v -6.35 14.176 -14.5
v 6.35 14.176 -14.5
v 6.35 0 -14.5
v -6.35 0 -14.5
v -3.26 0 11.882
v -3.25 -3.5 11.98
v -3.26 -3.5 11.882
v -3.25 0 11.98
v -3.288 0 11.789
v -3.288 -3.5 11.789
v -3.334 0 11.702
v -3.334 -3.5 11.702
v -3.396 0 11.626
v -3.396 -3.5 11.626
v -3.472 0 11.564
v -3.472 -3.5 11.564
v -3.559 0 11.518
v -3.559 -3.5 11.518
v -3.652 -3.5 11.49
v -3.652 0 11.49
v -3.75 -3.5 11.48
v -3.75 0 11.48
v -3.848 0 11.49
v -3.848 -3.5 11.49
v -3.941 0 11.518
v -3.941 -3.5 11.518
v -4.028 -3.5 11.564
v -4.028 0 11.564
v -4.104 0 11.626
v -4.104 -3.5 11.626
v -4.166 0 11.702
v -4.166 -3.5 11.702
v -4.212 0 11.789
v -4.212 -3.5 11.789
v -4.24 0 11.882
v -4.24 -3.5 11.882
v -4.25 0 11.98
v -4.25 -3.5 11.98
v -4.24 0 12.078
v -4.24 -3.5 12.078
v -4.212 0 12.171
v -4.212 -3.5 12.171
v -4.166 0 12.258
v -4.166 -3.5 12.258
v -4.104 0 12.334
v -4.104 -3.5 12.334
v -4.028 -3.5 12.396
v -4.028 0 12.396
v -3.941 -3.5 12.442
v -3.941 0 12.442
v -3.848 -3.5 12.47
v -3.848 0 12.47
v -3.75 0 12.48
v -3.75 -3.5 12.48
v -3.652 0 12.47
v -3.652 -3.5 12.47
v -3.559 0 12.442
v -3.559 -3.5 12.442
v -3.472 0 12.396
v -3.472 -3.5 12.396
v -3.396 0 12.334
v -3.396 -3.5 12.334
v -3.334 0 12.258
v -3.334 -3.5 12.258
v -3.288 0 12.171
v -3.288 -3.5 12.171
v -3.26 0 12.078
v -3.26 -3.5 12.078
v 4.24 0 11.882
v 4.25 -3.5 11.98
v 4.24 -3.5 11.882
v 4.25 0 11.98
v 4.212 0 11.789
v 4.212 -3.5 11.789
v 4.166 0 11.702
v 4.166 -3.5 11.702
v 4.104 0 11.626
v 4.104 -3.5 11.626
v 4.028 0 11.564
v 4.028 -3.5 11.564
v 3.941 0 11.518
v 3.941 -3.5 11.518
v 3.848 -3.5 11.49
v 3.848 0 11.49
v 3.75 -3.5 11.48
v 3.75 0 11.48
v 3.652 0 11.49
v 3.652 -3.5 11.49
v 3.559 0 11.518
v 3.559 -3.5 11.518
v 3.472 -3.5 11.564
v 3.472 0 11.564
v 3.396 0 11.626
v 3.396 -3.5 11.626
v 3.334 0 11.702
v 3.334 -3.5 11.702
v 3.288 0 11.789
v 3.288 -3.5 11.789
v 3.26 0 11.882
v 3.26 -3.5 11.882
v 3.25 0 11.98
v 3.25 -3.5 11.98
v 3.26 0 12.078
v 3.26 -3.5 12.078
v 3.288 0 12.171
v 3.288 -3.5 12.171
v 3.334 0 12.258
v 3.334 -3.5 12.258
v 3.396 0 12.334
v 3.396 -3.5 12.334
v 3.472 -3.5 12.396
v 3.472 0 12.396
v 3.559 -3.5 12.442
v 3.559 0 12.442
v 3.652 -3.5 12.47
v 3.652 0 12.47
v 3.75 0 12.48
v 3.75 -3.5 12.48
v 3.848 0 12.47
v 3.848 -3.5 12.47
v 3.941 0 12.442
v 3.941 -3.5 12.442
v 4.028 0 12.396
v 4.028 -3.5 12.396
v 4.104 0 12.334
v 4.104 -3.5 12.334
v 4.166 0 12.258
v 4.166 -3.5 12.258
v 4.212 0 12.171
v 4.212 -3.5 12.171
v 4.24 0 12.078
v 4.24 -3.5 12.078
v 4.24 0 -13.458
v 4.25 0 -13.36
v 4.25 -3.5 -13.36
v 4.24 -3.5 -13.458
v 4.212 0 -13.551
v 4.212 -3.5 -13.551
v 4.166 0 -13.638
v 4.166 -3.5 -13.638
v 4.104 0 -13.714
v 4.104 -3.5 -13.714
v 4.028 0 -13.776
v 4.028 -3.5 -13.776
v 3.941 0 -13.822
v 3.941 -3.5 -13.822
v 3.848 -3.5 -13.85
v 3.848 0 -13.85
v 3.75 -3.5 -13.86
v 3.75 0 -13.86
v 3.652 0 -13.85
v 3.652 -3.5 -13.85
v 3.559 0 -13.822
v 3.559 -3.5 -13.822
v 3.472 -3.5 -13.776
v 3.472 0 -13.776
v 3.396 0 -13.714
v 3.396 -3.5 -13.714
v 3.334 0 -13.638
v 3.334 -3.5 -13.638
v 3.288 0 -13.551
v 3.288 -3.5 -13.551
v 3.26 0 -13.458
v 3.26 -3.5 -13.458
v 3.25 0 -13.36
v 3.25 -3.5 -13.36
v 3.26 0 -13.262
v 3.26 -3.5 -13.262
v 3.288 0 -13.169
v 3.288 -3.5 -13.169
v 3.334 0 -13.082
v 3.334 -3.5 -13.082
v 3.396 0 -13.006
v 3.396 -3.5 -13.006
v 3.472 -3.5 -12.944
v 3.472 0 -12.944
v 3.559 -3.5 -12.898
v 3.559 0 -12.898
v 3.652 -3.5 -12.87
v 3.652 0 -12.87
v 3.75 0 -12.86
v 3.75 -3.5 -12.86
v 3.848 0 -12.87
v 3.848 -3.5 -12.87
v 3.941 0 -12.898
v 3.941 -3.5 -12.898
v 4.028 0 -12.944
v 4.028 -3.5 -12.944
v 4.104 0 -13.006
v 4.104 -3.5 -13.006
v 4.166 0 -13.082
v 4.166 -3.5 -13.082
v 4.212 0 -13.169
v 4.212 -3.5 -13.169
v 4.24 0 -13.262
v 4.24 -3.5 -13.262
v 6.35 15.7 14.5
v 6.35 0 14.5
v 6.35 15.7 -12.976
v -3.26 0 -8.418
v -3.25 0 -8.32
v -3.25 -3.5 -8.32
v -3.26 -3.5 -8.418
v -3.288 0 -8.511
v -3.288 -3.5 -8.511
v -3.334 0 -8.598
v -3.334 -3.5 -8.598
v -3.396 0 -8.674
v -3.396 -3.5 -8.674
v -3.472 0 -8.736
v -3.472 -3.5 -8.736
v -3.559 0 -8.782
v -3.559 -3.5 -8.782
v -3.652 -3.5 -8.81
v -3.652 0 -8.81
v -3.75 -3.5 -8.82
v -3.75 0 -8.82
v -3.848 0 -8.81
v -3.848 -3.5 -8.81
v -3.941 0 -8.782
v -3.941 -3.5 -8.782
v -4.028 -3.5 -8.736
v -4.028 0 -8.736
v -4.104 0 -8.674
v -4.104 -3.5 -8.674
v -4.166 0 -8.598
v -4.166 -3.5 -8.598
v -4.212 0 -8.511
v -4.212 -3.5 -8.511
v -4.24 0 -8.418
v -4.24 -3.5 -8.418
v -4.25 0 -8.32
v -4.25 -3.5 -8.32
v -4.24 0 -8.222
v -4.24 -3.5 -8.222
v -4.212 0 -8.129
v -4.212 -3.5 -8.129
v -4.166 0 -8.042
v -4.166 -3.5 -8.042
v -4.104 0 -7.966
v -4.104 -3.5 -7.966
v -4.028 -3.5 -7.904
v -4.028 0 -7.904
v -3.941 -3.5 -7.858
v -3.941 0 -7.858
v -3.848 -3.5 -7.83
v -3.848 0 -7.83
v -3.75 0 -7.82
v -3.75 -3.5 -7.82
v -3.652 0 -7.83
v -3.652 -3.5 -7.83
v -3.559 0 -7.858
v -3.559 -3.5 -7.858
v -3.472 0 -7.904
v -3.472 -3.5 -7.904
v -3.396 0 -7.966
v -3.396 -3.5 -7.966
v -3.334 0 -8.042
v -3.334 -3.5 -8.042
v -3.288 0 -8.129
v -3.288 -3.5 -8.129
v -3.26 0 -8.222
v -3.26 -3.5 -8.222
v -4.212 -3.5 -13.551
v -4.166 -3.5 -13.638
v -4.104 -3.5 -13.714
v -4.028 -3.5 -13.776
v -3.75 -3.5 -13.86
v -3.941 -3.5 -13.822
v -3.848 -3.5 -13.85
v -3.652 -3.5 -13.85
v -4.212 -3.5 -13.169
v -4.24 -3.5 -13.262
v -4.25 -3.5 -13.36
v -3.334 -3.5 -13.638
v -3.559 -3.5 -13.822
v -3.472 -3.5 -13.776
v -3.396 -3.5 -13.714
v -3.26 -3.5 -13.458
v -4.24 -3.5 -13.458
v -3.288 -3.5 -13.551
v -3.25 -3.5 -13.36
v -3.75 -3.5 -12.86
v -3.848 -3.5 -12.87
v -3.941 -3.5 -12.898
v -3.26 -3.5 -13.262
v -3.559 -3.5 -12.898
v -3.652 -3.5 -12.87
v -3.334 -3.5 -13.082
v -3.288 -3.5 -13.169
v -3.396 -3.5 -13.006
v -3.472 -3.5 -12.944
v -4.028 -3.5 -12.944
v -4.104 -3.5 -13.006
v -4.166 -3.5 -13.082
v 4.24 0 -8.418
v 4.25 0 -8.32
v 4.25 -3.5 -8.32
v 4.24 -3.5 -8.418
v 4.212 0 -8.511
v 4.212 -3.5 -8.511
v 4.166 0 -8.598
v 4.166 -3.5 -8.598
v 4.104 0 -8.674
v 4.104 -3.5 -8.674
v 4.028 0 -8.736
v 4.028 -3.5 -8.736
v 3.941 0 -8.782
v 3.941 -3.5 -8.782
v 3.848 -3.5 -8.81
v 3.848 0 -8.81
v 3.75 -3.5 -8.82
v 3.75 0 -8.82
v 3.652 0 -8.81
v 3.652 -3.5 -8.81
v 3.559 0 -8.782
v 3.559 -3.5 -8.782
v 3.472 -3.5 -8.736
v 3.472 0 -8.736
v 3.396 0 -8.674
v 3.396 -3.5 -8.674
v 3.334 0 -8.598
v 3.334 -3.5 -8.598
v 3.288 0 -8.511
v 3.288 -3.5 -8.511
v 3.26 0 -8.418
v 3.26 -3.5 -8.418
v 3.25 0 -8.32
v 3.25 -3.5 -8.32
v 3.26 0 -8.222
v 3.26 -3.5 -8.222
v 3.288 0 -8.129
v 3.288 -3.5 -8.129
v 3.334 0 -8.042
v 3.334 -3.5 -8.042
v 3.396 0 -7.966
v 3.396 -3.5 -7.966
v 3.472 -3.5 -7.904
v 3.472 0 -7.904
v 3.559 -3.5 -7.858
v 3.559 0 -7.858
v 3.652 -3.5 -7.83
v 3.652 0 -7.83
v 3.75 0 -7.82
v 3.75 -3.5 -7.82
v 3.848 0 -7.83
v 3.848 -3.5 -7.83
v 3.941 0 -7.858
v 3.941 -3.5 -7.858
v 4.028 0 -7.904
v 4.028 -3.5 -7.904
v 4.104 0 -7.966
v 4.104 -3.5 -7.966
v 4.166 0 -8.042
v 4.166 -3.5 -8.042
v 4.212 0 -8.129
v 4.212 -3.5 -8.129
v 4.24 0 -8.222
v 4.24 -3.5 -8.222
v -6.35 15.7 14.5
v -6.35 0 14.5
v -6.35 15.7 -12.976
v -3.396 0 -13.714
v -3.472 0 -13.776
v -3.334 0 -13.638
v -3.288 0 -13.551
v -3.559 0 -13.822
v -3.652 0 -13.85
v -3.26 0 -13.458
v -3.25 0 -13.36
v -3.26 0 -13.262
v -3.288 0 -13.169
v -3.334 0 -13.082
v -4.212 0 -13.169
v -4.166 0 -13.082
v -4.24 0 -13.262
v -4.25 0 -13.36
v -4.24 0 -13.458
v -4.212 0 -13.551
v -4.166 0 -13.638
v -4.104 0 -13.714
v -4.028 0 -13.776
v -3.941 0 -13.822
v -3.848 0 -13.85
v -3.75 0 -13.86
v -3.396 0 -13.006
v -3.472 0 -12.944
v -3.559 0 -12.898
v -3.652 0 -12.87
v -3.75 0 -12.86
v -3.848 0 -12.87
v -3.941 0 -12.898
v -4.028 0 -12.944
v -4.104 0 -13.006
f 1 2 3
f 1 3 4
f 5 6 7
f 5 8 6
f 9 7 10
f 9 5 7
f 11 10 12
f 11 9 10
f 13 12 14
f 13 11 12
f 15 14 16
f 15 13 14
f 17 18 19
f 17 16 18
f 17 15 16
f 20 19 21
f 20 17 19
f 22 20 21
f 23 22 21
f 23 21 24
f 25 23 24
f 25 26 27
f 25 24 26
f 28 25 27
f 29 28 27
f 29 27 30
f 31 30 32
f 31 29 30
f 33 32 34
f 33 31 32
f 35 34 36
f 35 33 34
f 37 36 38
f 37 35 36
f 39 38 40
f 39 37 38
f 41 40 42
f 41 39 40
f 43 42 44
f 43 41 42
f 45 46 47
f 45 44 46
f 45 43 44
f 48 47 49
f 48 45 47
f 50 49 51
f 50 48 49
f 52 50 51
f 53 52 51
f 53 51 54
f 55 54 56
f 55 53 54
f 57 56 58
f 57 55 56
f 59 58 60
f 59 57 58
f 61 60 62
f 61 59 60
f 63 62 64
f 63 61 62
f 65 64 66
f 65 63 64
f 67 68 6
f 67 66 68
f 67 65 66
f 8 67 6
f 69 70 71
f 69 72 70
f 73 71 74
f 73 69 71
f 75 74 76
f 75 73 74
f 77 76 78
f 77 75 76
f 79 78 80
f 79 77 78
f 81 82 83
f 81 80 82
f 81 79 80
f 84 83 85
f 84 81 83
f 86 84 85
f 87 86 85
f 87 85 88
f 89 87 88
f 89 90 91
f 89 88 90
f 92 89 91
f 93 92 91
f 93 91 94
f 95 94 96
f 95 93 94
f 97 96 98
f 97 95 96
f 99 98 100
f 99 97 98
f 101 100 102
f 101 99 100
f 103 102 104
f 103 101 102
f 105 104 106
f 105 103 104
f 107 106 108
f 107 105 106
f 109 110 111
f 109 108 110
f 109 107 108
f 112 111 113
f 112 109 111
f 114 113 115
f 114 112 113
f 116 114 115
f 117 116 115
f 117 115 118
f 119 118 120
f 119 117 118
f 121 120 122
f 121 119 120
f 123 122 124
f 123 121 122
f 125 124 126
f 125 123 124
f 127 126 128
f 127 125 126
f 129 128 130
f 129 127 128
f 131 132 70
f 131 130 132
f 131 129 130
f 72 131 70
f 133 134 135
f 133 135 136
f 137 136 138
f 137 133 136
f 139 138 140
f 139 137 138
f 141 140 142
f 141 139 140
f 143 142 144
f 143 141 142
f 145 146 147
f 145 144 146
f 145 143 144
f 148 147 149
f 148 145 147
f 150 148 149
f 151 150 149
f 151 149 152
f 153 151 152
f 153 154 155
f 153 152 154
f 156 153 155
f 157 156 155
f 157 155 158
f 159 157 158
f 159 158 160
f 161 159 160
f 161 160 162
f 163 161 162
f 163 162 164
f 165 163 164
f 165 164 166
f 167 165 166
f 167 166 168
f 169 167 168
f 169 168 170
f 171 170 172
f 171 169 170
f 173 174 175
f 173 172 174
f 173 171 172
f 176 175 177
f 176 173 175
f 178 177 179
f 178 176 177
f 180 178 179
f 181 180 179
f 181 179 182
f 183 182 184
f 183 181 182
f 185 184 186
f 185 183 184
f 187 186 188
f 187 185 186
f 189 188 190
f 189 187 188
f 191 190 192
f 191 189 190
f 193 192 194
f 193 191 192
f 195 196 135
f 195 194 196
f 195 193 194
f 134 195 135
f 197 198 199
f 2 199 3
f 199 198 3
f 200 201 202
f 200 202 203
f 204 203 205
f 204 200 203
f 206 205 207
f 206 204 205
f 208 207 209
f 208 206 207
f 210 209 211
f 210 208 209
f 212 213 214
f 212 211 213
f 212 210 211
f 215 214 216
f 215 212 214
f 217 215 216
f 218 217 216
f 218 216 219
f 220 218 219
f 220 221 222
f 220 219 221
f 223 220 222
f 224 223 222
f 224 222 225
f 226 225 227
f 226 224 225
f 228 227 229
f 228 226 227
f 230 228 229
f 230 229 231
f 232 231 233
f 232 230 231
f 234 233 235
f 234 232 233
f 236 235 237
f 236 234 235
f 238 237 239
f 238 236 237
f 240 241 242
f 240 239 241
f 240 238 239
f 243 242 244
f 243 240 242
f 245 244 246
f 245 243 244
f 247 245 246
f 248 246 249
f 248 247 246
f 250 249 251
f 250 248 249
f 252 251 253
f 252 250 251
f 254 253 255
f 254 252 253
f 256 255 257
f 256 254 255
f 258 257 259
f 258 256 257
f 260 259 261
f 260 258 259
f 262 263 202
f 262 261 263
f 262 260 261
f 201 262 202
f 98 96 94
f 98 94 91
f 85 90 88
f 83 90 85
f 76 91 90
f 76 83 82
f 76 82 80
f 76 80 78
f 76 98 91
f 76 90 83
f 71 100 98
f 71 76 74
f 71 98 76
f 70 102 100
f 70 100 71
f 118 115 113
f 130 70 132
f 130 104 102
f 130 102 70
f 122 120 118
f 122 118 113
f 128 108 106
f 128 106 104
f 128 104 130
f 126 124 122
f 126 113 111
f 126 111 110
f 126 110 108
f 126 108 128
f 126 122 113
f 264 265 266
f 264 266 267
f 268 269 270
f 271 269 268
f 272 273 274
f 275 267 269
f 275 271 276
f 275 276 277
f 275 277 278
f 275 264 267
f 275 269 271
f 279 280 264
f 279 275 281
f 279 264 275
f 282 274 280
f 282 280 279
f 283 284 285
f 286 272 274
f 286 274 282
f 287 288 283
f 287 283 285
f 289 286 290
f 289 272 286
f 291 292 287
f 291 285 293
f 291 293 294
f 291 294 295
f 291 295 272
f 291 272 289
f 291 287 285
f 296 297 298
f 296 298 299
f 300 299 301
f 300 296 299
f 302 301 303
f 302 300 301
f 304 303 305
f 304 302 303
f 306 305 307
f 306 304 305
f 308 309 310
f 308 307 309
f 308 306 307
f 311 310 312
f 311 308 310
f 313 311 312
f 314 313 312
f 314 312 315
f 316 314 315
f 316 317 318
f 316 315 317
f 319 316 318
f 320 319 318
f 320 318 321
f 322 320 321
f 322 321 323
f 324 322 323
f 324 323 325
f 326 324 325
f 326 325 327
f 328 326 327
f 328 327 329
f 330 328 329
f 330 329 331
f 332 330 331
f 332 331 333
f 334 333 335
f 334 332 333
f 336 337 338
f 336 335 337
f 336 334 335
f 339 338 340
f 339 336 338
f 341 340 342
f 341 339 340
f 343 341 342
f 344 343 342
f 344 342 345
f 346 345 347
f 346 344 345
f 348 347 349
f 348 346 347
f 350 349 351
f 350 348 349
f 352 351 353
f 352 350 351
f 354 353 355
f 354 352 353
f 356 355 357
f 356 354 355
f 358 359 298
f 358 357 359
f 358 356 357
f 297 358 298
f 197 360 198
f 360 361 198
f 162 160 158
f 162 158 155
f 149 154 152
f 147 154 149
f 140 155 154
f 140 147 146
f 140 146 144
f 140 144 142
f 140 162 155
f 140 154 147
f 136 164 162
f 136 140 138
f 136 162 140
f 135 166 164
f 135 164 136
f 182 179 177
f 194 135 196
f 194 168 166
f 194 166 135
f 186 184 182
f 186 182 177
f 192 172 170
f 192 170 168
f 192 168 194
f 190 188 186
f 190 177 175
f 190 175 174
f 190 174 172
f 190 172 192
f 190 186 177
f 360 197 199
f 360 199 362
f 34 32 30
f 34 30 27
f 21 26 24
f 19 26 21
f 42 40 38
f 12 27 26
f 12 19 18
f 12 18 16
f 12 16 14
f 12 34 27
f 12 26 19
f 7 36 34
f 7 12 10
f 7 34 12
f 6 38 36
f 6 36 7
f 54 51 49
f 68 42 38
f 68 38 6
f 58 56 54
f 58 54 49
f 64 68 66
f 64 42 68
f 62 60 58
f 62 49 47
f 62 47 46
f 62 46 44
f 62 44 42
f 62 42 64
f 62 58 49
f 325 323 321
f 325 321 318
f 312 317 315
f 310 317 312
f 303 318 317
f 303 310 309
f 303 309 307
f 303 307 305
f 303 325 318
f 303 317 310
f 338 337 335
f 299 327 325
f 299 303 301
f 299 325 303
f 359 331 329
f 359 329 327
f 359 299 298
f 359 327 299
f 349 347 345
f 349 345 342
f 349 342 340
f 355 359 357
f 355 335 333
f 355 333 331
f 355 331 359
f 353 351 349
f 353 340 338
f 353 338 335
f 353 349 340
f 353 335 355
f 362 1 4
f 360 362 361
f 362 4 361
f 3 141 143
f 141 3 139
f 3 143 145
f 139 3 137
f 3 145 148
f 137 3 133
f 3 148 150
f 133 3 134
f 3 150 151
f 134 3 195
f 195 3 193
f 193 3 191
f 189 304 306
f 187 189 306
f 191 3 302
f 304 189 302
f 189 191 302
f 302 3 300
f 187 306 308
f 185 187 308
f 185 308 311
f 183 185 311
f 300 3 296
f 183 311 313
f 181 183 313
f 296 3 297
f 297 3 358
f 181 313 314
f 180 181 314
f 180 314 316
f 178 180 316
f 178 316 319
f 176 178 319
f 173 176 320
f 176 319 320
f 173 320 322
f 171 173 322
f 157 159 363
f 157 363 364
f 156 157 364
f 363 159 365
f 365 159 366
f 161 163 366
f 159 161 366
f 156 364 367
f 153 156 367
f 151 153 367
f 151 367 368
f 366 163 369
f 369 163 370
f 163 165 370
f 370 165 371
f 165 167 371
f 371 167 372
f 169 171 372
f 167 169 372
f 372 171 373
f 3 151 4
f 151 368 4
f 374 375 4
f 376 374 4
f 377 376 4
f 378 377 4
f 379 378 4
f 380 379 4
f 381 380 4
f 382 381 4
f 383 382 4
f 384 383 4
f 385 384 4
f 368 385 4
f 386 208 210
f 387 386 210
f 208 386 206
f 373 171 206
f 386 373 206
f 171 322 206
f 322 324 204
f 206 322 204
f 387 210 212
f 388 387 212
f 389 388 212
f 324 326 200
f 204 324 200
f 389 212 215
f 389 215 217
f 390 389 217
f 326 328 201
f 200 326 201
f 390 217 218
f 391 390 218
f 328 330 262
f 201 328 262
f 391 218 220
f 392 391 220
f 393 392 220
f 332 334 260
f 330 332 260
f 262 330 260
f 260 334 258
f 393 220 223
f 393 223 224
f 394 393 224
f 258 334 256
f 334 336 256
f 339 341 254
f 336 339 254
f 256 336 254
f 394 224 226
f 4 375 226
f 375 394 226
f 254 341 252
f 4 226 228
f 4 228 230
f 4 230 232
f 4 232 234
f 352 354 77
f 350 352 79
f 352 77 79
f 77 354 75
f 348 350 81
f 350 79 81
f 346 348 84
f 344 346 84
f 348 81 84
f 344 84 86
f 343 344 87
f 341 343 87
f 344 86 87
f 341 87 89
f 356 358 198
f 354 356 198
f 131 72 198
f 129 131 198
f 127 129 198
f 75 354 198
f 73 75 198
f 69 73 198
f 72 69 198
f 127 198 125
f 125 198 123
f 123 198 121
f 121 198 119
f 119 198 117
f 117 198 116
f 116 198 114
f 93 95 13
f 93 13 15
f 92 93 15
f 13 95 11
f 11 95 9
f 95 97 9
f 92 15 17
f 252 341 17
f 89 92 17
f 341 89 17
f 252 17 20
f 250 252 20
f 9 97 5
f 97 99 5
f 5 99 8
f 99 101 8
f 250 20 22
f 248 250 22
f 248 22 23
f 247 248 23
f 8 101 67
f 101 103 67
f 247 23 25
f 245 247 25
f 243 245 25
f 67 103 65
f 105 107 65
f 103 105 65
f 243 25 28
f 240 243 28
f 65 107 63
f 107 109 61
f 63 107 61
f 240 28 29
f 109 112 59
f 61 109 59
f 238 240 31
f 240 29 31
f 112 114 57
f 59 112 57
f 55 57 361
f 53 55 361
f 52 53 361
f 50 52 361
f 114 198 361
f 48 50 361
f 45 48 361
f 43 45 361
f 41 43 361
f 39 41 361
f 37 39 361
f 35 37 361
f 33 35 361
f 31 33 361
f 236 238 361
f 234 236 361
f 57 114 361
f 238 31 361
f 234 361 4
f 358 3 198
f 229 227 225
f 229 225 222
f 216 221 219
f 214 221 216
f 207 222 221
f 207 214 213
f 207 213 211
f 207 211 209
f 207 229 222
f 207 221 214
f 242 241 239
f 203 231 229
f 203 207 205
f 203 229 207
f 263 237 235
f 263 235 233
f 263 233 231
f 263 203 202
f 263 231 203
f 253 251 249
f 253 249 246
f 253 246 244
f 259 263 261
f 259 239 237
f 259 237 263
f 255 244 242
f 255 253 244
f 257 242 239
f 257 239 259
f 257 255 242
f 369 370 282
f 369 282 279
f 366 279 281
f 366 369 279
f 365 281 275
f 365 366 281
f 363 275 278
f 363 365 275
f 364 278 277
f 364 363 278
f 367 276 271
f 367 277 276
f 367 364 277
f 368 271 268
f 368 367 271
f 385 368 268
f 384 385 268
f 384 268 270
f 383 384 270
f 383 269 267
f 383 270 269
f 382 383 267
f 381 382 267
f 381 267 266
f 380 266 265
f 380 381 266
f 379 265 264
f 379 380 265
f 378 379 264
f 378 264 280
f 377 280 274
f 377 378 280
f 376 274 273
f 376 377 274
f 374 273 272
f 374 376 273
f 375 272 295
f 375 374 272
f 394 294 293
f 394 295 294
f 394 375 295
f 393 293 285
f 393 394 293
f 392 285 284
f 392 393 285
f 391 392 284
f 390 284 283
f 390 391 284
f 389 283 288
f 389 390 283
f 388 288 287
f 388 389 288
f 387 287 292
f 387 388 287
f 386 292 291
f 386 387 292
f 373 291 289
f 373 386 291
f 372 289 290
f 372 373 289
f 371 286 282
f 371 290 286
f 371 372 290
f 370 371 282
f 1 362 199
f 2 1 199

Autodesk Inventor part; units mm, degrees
ref_plane "YZ Plane" through (0, 0, 0) normal (1, 0, 0) x (0, 1, 0)
ref_plane "XZ Plane" through (0, 0, 0) normal (0, 1, 0) x (-1, 0, 0)
ref_plane "XY Plane" through (0, 0, 0) normal (0, 0, 1) x (1, 0, 0)
sketch "Sketch1" plane through (0, 0, 0) normal (0, 1, 0) x (-1, 0, 0)
  line L0 (6.35, 14.5) -> (-6.35, 14.5)
  line L1 (-6.35, 14.5) -> (-6.35, -14.5)
  line L2 (-6.35, -14.5) -> (6.35, -14.5)
  line L3 (6.35, -14.5) -> (6.35, 14.5)
  point P0 (0, 0)
  dimension "d0" = 29
  dimension "d1" = 12.7
  dimension "d2" = 6.35
  dimension "d3" = 14.5
extrude "Extrusion1" add sketch "Sketch1" along normal blind 15.7
sketch "Sketch2" plane through (0, 0, 0) normal (0, -1, 0) x (1, 0, 0)
  line L0 (-6.35, 14.5) -> (6.35, 14.5) projected
  line L1 (-6.35, -14.5) -> (-6.35, 14.5) projected
  line L2 (6.35, -14.5) -> (-6.35, -14.5) projected
  line L3 (6.35, 14.5) -> (6.35, -14.5) projected
  circle A0 centre (3.75, -13.36) radius 0.5
  circle A1 centre (-3.75, -8.32) radius 0.5
  circle A2 centre (3.75, -8.32) radius 0.5
  circle A3 centre (-3.75, -13.36) radius 0.5
  circle A4 centre (3.75, 11.98) radius 0.5
  circle A5 centre (-3.75, 11.98) radius 0.5
  point P0 (0, 0)
  dimension "d9" = 1
  dimension "d10" = 1
  dimension "d11" = 1
  dimension "d12" = 1
  dimension "d15" = 5.04
  dimension "d17" = 7.5
  dimension "d18" = 3.75
  dimension "d19" = 1
  dimension "d20" = 1
  dimension "d22" = 20.3
  dimension "d28" = 2.52
extrude "Extrusion2" add sketch "Sketch2" along normal blind 3.5 contours A0 | A1 | A2 | A3 | A4 | A5
chamfer "Chamfer2" distance 1.524 angle 45 1 edges at (0, 15.7, -14.5)
equation "\"d2\" = 0.5 * d1"
equation "\"d3\" = 0.5 * d0"
equation "\"d10\" = d9"
equation "\"d11\" = d9"
equation "\"d12\" = d9"
equation "\"d18\" = 0.5 * d17"
equation "\"d19\" = d9"
equation "\"d20\" = d9"
properties part number "RZ03-1A4-D005"
